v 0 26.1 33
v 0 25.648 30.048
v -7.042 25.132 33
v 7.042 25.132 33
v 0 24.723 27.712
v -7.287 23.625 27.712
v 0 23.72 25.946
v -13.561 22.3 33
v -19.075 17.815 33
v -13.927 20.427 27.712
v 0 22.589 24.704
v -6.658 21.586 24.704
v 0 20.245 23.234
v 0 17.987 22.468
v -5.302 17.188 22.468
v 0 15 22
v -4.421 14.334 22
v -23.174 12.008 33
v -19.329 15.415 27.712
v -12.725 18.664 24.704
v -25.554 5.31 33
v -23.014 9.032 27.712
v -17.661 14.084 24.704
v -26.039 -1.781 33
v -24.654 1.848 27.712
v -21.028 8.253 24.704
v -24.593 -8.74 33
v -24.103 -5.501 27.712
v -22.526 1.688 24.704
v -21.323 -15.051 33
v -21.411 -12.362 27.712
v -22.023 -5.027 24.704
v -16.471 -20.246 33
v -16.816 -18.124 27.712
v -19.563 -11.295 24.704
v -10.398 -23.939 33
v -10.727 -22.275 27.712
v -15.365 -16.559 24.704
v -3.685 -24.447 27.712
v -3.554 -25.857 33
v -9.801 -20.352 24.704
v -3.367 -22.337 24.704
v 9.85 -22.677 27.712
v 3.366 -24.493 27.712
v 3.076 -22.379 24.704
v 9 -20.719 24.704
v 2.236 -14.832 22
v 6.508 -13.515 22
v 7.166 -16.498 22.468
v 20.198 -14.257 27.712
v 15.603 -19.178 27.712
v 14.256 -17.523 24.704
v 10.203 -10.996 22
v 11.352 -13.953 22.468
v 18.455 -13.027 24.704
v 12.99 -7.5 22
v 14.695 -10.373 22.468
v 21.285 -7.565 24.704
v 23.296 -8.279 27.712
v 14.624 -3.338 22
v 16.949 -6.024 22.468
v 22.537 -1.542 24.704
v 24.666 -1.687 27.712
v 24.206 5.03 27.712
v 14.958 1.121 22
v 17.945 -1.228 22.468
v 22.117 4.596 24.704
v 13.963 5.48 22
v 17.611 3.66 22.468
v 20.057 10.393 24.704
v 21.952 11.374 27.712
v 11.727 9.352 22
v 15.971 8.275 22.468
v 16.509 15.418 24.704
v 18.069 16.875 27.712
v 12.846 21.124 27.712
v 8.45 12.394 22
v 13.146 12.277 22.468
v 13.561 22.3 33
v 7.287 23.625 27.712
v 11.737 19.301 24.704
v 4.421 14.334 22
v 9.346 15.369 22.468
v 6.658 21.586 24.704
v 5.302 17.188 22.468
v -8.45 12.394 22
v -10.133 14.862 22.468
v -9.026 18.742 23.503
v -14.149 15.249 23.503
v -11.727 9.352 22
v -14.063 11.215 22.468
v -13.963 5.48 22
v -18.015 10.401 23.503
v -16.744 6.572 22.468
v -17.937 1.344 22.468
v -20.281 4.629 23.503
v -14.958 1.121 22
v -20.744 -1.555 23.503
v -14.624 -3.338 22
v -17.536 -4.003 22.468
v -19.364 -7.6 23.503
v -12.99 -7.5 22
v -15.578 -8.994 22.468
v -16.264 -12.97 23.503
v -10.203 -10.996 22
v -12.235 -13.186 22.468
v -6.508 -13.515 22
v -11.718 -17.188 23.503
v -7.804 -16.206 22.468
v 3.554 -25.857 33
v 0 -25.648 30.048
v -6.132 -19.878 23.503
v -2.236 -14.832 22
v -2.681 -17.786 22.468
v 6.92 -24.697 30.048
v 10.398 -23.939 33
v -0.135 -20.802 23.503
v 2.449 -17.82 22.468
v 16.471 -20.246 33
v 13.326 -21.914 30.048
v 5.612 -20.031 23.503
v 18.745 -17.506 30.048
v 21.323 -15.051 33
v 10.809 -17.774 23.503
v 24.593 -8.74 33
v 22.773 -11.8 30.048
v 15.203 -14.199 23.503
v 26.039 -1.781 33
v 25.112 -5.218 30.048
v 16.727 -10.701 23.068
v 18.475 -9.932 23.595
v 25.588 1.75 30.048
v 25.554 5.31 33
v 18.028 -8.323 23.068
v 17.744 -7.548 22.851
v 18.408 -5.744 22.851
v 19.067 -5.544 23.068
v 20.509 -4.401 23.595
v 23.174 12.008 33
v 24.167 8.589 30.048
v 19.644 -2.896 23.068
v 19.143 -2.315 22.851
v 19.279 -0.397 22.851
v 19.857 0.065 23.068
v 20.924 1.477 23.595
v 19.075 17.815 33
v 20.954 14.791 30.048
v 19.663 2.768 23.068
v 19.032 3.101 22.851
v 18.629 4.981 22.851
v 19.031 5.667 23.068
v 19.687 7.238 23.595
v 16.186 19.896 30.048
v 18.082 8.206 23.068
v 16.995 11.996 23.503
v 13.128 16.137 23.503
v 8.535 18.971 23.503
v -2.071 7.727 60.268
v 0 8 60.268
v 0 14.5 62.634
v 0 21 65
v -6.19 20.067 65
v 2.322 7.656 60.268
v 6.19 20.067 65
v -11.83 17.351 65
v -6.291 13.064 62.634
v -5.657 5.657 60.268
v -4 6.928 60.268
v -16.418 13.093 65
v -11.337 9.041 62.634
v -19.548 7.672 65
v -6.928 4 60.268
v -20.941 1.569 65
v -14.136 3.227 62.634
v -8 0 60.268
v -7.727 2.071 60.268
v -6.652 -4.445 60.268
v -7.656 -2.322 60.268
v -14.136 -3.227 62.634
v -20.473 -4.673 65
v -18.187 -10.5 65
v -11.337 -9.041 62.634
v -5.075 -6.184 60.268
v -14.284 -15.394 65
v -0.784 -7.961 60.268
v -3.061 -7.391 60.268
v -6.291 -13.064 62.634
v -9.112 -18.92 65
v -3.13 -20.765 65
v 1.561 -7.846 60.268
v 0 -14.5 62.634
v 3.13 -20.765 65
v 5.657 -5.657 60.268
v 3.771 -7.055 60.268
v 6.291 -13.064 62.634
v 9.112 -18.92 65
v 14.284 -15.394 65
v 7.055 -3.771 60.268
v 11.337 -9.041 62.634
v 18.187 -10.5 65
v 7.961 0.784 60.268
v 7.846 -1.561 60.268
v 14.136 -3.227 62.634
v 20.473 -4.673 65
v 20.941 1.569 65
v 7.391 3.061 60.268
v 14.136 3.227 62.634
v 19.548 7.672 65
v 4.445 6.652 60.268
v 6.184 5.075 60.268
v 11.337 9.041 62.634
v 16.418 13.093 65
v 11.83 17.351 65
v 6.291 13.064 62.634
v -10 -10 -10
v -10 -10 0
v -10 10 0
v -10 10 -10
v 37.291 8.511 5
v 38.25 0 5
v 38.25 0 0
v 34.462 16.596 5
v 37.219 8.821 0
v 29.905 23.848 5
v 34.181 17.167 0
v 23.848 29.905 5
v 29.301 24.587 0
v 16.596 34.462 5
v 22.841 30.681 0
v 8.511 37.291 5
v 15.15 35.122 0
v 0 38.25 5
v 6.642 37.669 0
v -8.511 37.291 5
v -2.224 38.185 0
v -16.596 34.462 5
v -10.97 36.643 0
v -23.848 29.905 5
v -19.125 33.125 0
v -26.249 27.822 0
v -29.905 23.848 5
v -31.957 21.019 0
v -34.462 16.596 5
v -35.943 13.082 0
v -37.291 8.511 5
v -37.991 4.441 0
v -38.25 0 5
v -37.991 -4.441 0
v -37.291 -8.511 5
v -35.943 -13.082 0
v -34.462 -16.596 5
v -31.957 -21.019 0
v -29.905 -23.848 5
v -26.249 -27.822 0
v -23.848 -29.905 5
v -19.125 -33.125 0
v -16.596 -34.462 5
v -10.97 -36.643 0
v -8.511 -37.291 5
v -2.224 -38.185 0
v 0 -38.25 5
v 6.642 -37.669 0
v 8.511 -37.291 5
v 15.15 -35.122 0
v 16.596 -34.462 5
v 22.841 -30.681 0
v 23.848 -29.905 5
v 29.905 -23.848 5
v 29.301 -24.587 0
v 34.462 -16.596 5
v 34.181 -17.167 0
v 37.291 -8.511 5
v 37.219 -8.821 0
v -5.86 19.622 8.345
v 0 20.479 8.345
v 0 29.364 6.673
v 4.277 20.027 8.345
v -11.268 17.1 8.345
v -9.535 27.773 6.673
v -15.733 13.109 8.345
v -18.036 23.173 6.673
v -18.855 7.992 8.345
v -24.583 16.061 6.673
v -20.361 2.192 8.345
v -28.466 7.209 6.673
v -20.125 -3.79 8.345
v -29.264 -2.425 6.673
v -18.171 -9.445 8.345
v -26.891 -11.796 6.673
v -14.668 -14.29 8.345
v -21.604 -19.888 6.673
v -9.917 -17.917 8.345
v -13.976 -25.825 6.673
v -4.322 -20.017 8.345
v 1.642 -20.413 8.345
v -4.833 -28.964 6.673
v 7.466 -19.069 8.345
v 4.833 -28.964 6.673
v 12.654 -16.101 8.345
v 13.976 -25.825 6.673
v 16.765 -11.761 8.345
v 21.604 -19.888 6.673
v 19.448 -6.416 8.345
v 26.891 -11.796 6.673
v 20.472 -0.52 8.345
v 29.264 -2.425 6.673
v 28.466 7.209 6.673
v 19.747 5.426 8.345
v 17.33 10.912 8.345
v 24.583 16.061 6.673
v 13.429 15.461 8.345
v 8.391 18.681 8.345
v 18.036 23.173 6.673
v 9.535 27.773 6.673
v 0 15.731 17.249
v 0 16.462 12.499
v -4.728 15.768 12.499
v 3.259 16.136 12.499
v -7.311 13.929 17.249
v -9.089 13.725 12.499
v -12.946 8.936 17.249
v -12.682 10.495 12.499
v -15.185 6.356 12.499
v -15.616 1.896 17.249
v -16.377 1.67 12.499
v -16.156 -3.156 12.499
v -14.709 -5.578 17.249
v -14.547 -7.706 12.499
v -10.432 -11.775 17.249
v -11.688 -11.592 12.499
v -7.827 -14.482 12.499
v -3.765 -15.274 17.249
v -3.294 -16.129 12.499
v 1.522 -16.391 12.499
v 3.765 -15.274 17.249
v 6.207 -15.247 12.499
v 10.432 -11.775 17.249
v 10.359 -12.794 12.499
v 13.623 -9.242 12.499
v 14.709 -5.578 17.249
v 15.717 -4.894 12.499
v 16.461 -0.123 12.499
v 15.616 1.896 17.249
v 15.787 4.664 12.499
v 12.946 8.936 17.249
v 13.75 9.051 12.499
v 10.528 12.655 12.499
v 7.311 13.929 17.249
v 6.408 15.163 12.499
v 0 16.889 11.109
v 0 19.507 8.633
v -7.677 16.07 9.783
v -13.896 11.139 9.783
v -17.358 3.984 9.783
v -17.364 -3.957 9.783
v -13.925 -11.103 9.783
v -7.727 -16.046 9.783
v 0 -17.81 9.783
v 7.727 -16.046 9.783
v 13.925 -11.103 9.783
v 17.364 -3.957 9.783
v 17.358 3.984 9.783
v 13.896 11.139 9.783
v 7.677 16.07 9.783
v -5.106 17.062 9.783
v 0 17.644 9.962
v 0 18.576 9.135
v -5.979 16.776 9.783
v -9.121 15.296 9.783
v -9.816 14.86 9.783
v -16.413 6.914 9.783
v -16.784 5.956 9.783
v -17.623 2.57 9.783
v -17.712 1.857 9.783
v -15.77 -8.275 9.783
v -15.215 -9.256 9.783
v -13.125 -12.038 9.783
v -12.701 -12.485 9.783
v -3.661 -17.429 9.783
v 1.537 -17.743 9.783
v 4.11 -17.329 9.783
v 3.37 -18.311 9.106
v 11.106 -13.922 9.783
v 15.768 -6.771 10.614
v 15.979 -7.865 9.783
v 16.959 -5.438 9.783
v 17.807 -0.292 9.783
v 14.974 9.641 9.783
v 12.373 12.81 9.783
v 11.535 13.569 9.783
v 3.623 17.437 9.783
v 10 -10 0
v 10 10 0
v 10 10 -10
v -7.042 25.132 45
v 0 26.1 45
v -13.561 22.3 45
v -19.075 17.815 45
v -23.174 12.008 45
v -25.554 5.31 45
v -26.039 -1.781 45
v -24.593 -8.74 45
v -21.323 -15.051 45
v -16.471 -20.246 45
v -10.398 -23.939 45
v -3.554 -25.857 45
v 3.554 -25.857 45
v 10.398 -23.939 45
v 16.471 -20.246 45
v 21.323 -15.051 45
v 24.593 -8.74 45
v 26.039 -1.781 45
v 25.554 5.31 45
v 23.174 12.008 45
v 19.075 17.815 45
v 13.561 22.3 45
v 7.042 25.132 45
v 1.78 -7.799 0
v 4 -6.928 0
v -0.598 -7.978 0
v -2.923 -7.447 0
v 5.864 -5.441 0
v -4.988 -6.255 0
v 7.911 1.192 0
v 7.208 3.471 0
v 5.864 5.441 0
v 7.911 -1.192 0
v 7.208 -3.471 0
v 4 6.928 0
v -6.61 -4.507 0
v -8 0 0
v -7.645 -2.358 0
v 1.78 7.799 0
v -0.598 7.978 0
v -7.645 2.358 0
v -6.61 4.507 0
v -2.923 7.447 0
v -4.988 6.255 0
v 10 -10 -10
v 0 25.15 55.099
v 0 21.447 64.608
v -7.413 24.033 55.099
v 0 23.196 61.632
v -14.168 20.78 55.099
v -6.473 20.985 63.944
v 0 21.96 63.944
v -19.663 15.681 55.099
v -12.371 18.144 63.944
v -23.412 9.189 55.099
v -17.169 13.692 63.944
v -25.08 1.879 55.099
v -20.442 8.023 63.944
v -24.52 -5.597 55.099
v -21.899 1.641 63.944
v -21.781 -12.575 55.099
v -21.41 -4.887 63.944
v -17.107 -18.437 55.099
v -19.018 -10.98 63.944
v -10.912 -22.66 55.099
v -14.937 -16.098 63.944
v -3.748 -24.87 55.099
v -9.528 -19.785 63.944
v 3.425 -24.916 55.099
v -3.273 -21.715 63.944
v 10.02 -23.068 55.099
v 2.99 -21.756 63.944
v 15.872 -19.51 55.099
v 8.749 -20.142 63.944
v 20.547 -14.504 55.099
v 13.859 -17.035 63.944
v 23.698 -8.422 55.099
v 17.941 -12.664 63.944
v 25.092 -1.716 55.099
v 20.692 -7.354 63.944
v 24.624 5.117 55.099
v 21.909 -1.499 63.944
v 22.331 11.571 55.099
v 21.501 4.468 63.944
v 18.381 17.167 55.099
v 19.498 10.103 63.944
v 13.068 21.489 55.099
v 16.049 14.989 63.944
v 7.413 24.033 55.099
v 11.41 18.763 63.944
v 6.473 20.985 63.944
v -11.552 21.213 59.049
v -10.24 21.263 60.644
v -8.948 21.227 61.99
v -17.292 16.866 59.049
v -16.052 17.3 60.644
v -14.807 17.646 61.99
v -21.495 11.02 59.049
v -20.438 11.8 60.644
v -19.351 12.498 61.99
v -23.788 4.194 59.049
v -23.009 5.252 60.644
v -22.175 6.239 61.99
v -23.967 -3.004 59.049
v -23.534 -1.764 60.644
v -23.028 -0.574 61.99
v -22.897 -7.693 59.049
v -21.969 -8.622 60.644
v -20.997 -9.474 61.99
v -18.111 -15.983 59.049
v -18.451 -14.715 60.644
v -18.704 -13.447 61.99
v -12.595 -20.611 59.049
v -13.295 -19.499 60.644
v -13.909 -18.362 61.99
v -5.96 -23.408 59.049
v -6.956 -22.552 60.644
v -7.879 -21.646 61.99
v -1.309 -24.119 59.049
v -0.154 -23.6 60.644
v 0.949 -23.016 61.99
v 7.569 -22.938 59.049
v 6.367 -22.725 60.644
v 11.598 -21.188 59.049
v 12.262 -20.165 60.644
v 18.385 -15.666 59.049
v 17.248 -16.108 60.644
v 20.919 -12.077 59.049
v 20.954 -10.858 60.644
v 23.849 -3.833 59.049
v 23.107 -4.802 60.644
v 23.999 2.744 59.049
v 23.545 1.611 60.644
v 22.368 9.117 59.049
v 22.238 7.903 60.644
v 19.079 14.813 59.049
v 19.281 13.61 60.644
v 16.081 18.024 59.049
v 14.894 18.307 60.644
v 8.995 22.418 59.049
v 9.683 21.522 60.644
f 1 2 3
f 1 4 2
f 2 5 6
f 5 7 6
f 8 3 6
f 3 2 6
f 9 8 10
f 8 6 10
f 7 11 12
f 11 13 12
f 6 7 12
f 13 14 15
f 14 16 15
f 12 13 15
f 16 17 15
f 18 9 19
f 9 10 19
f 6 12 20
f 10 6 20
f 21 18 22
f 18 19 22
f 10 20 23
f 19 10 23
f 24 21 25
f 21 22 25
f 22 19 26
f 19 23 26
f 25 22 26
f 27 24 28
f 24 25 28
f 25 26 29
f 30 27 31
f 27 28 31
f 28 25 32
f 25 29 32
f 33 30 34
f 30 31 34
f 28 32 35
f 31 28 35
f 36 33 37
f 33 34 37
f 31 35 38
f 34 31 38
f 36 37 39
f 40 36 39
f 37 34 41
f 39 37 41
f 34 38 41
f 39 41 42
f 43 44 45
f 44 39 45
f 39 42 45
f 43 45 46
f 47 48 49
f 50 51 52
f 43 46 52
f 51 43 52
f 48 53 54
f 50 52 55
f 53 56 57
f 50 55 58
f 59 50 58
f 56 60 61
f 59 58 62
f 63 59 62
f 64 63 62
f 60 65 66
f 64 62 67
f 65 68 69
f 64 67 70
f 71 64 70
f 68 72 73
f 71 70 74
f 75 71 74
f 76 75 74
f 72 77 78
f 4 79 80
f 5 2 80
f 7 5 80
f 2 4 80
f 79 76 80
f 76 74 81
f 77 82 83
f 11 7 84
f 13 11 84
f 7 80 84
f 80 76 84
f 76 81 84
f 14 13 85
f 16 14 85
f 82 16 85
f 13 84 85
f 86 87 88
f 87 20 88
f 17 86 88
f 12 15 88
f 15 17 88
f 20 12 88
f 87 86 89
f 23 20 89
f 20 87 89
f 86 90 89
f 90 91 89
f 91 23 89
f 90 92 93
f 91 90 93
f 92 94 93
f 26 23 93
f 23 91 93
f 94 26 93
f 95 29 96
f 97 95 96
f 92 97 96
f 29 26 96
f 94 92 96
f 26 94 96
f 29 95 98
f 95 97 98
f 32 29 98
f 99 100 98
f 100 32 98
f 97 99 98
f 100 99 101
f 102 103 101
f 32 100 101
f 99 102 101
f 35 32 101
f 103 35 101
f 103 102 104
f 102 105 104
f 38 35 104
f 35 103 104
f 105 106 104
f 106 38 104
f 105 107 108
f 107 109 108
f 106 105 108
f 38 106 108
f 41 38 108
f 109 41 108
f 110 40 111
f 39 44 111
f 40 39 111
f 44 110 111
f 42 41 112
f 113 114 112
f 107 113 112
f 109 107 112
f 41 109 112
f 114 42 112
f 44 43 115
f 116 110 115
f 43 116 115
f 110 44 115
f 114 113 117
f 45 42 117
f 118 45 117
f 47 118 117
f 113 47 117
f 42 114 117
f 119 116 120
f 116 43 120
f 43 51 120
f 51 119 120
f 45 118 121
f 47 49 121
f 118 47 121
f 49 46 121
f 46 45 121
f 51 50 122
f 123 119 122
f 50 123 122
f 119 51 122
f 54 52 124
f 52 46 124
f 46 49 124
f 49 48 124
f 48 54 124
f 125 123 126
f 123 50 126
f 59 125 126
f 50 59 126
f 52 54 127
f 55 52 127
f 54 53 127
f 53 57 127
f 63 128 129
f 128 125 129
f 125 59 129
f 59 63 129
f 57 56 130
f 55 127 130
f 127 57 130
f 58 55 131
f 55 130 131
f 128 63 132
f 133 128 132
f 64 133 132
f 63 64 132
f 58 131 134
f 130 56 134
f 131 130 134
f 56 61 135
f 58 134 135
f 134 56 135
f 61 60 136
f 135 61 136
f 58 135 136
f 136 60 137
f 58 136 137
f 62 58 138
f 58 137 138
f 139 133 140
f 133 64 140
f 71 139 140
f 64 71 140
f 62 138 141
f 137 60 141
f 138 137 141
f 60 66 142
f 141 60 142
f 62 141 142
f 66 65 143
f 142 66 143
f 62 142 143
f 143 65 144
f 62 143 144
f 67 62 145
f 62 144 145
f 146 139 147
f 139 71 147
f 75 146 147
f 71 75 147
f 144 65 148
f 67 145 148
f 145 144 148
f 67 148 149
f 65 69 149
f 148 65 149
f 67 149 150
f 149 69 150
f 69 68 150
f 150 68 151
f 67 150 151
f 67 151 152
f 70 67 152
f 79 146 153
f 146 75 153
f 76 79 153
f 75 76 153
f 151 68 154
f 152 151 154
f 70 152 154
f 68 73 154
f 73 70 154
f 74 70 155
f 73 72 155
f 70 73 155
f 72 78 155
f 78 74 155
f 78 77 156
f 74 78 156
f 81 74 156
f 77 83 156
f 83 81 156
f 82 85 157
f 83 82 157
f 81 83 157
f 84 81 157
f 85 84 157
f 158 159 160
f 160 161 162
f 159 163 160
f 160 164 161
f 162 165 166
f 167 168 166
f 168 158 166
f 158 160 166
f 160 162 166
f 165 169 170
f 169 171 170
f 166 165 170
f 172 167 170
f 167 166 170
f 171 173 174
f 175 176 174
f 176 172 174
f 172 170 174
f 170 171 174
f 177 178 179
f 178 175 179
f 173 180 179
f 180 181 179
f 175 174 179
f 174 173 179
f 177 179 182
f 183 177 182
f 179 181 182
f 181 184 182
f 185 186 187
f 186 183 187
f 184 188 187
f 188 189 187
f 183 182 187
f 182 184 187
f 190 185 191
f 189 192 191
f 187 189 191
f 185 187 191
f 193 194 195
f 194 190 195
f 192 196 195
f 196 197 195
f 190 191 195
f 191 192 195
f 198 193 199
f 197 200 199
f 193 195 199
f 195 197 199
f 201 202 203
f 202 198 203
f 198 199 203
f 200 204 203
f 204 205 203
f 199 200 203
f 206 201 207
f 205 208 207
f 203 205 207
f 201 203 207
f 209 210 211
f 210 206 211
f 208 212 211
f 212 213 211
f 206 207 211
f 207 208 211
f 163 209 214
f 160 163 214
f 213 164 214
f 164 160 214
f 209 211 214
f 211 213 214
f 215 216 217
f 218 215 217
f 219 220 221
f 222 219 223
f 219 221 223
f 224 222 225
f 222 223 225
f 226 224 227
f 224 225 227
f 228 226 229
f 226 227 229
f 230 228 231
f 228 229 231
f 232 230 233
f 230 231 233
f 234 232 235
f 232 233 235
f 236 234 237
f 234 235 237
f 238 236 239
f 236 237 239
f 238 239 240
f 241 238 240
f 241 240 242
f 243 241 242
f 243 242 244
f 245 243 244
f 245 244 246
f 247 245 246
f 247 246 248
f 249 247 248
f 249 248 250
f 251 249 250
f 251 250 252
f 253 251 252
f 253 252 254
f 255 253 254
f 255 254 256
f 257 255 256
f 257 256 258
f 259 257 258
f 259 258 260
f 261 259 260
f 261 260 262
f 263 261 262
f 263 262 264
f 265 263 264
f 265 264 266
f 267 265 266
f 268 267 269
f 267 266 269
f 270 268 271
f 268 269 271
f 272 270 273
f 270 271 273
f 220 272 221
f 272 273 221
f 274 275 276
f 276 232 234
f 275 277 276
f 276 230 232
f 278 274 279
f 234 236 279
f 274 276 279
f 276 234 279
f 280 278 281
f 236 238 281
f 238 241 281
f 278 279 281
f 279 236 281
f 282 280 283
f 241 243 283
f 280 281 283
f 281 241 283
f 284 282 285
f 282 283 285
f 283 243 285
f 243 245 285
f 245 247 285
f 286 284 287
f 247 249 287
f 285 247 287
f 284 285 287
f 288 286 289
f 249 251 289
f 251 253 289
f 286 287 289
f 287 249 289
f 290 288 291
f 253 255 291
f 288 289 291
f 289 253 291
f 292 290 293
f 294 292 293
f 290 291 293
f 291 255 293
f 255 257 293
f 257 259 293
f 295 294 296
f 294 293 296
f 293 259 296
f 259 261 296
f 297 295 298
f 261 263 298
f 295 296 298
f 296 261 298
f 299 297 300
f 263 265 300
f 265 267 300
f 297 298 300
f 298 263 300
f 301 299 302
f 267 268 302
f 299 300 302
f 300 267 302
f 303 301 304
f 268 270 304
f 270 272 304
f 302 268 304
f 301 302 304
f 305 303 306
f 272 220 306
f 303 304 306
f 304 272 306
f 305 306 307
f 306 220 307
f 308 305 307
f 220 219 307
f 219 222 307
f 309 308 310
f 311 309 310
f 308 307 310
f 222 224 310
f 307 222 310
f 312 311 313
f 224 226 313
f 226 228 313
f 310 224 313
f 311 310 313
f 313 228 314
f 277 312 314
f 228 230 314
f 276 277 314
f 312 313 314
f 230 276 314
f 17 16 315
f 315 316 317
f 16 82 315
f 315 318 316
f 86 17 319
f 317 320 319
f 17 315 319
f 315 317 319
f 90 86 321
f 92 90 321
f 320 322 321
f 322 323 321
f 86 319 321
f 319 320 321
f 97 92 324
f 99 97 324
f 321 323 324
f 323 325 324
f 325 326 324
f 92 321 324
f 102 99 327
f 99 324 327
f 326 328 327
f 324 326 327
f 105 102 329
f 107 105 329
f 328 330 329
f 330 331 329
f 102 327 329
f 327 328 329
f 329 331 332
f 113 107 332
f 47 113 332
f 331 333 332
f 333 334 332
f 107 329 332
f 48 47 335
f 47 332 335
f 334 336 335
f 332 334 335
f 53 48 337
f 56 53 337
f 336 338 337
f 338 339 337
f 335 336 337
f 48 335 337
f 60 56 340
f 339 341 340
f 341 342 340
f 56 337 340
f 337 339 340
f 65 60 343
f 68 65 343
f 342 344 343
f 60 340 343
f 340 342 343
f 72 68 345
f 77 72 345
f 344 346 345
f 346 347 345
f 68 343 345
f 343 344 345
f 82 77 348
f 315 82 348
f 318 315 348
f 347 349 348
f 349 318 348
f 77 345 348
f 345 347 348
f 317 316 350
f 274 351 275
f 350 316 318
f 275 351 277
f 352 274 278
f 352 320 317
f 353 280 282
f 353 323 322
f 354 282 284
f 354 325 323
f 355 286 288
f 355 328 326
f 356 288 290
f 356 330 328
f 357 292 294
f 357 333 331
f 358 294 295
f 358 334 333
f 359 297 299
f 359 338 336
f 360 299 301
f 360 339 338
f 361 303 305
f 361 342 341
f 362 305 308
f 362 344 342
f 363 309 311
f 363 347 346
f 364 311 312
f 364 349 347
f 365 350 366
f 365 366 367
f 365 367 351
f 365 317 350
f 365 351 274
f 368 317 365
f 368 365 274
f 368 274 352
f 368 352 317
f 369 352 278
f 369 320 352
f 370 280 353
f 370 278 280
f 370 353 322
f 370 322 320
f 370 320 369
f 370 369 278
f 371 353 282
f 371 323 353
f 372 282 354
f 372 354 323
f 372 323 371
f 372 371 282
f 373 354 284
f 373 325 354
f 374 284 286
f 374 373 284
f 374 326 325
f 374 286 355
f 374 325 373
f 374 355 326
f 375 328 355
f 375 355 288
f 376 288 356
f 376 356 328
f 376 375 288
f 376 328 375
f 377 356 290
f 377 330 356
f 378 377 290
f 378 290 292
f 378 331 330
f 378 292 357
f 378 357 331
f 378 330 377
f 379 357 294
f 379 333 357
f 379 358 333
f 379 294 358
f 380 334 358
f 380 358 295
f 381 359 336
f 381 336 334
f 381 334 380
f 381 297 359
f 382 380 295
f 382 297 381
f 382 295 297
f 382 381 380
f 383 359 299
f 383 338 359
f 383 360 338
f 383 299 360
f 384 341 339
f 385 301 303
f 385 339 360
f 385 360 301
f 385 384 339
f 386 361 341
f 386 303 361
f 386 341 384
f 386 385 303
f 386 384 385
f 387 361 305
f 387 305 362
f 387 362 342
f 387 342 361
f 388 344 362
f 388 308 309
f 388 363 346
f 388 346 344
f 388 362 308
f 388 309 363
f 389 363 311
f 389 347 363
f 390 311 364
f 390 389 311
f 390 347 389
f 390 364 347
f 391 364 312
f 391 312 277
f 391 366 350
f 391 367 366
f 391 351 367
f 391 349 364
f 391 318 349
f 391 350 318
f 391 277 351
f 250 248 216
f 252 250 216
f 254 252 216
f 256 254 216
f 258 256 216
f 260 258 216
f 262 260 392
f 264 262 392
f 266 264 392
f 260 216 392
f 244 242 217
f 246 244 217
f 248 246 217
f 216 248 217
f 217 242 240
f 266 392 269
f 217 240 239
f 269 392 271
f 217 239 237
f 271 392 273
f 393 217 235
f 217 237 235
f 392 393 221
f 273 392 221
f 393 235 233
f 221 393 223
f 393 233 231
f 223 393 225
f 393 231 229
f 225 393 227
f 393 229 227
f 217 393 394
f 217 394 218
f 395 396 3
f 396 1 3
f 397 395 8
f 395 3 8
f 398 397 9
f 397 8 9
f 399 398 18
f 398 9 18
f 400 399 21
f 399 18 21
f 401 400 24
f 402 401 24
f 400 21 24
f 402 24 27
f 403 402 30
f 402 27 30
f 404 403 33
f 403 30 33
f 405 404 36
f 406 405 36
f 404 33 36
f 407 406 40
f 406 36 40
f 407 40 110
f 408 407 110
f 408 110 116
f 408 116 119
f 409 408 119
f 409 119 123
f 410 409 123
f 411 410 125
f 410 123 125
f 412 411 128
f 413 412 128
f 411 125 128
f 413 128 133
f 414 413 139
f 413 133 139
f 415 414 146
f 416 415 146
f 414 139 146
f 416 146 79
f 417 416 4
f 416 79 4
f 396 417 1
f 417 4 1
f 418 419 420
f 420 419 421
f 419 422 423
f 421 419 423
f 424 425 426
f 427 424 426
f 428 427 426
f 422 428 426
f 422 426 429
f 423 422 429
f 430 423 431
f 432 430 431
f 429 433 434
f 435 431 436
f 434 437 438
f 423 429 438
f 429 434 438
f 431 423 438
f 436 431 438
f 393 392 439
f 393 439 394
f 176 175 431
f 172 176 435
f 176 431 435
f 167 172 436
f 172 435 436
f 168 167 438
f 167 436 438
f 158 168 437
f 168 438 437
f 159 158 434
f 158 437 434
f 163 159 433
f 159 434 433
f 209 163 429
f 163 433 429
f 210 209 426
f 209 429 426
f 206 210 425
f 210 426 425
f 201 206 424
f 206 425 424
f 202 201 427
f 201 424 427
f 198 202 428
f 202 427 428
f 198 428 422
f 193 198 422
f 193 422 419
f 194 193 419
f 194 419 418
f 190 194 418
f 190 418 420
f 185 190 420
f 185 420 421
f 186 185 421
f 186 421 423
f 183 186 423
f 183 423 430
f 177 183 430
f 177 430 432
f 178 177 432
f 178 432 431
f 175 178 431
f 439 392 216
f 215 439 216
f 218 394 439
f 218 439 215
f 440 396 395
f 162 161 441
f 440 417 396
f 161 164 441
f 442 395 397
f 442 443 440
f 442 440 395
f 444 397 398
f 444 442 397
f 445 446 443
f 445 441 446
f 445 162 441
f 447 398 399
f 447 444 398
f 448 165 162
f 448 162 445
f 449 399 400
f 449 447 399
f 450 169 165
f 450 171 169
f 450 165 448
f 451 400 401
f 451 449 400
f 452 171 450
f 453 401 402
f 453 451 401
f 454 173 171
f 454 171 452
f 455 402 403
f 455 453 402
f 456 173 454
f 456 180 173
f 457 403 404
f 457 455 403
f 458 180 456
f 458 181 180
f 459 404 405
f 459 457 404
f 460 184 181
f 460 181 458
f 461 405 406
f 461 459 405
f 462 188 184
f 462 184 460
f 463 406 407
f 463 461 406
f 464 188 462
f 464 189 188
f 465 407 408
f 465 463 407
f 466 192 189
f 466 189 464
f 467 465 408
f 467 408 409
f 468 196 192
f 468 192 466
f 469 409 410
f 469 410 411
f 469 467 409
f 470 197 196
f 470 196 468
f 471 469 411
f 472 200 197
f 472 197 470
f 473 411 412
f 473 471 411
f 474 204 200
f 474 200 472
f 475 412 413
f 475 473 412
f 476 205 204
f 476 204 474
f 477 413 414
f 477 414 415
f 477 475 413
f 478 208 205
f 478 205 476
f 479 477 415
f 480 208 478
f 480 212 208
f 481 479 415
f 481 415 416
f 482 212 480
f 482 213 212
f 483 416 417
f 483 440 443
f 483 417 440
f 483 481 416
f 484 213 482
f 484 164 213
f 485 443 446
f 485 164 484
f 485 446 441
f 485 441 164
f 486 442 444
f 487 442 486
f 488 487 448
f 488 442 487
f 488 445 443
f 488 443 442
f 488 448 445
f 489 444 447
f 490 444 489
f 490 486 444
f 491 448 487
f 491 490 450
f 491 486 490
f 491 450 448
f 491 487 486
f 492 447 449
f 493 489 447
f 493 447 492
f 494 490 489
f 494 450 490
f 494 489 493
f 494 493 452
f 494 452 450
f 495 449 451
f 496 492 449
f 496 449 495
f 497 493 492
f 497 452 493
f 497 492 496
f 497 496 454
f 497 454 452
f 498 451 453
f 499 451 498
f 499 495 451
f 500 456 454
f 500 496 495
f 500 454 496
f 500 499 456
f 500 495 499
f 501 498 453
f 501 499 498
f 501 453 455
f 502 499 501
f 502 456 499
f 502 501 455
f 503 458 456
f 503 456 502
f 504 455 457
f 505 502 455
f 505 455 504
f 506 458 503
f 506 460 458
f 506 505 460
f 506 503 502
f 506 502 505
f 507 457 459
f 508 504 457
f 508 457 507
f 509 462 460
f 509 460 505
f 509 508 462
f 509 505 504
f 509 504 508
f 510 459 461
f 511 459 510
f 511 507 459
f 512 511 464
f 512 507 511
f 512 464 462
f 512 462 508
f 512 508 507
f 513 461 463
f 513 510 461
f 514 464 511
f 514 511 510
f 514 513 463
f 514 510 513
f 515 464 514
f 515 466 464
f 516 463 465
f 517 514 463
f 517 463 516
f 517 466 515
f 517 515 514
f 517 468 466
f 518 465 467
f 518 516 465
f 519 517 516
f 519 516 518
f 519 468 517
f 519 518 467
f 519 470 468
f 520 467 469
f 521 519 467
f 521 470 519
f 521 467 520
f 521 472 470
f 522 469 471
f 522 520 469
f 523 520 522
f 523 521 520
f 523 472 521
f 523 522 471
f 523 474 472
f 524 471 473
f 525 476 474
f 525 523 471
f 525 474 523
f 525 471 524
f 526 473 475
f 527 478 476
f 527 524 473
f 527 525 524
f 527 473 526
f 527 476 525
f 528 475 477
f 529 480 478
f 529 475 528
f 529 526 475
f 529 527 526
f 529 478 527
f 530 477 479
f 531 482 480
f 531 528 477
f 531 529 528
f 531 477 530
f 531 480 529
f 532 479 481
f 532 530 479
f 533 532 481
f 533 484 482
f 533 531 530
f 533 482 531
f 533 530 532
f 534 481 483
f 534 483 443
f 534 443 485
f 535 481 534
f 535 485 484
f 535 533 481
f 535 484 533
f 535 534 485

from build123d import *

# Parameters (mm, degrees)
SKETCH_1_R          = 38.25
EXTRUDE_1_DEPTH     = 5
FILLET_1_R          = 5
SKETCH_5_R          = 8
CUT_EXTRUDE_1_DEPTH = 66.0000001
SKETCH_6_W          = 20
SKETCH_6_H          = 20
EXTRUDE_2_DEPTH     = 10


with BuildPart() as part:
    # ｽｹｯﾁ1 → ﾎﾞｽ - 押し出し1 (new body)
    with BuildSketch(Plane.XY):
        Circle(SKETCH_1_R)
    extrude(amount=EXTRUDE_1_DEPTH)

    # ｽｹｯﾁ2 → 回転1 (revolve)
    with BuildSketch(Plane(origin=(0, 0, 0), x_dir=(0, 0, -1), z_dir=(1, 0, 0))):
        Polygon((-22, 0), (-22, 15), (-9, 17), (-5, 38.25), (-5, 0), align=None)
    revolve(axis=Axis((0, 0, 0), (0, 0, 1)))

    # ﾌｨﾚｯﾄ1
    fillet_1_edges = [part.edges().sort_by_distance(p)[0] for p in [
        (0, -17, 9),
    ]]
    fillet(fillet_1_edges, radius=FILLET_1_R)

    # ｽｹｯﾁ3 → 回転2 (revolve)
    with BuildSketch(Plane(origin=(0, 0, 0), x_dir=(0, 0, -1), z_dir=(1, 0, 0))):
        with BuildLine():
            Line((-45, 26.1), (-33, 26.1))
            add(Edge.make_bspline(
                [(-33, 26.1), (-30.010138273, 26.1), (-26.820768311, 24.254113599), (-25.622496591, 23.557974687), (-22.470712298, 20.950193944), (-22, 15)],
                knots=[0, 0, 0, 0, 0.463324442, 0.563324442, 1, 1, 1, 1], degree=3))
            Line((-22, 15), (-22, 0))
            Line((-22, 0), (-57.35662508, 0))
            Line((-57.35662508, 0), (-65, 21))
            add(Edge.make_bspline(
                [(-45, 26.1), (-57.846202283, 26.003969711), (-64.230299253, 22.294062624), (-65, 21)],
                knots=[0, 0, 0, 0, 1, 1, 1, 1], degree=3))
        make_face()
    revolve(axis=Axis((0, 0, 0), (0, 0, 1)))

    # ｽｹｯﾁ5 → ｶｯﾄ - 押し出し1 (cut, through all)
    with BuildSketch(Plane(origin=(0, 0, 0), x_dir=(-1, 0, 0), z_dir=(0, 0, -1))):
        Circle(SKETCH_5_R)
    extrude(amount=-CUT_EXTRUDE_1_DEPTH, mode=Mode.SUBTRACT)

    # ｽｹｯﾁ6 → ﾎﾞｽ - 押し出し2 (add)
    with BuildSketch(Plane(origin=(0, 0, 0), x_dir=(-1, 0, 0), z_dir=(0, 0, -1))):
        Rectangle(SKETCH_6_W, SKETCH_6_H)
    extrude(amount=EXTRUDE_2_DEPTH)


solid = part.part
